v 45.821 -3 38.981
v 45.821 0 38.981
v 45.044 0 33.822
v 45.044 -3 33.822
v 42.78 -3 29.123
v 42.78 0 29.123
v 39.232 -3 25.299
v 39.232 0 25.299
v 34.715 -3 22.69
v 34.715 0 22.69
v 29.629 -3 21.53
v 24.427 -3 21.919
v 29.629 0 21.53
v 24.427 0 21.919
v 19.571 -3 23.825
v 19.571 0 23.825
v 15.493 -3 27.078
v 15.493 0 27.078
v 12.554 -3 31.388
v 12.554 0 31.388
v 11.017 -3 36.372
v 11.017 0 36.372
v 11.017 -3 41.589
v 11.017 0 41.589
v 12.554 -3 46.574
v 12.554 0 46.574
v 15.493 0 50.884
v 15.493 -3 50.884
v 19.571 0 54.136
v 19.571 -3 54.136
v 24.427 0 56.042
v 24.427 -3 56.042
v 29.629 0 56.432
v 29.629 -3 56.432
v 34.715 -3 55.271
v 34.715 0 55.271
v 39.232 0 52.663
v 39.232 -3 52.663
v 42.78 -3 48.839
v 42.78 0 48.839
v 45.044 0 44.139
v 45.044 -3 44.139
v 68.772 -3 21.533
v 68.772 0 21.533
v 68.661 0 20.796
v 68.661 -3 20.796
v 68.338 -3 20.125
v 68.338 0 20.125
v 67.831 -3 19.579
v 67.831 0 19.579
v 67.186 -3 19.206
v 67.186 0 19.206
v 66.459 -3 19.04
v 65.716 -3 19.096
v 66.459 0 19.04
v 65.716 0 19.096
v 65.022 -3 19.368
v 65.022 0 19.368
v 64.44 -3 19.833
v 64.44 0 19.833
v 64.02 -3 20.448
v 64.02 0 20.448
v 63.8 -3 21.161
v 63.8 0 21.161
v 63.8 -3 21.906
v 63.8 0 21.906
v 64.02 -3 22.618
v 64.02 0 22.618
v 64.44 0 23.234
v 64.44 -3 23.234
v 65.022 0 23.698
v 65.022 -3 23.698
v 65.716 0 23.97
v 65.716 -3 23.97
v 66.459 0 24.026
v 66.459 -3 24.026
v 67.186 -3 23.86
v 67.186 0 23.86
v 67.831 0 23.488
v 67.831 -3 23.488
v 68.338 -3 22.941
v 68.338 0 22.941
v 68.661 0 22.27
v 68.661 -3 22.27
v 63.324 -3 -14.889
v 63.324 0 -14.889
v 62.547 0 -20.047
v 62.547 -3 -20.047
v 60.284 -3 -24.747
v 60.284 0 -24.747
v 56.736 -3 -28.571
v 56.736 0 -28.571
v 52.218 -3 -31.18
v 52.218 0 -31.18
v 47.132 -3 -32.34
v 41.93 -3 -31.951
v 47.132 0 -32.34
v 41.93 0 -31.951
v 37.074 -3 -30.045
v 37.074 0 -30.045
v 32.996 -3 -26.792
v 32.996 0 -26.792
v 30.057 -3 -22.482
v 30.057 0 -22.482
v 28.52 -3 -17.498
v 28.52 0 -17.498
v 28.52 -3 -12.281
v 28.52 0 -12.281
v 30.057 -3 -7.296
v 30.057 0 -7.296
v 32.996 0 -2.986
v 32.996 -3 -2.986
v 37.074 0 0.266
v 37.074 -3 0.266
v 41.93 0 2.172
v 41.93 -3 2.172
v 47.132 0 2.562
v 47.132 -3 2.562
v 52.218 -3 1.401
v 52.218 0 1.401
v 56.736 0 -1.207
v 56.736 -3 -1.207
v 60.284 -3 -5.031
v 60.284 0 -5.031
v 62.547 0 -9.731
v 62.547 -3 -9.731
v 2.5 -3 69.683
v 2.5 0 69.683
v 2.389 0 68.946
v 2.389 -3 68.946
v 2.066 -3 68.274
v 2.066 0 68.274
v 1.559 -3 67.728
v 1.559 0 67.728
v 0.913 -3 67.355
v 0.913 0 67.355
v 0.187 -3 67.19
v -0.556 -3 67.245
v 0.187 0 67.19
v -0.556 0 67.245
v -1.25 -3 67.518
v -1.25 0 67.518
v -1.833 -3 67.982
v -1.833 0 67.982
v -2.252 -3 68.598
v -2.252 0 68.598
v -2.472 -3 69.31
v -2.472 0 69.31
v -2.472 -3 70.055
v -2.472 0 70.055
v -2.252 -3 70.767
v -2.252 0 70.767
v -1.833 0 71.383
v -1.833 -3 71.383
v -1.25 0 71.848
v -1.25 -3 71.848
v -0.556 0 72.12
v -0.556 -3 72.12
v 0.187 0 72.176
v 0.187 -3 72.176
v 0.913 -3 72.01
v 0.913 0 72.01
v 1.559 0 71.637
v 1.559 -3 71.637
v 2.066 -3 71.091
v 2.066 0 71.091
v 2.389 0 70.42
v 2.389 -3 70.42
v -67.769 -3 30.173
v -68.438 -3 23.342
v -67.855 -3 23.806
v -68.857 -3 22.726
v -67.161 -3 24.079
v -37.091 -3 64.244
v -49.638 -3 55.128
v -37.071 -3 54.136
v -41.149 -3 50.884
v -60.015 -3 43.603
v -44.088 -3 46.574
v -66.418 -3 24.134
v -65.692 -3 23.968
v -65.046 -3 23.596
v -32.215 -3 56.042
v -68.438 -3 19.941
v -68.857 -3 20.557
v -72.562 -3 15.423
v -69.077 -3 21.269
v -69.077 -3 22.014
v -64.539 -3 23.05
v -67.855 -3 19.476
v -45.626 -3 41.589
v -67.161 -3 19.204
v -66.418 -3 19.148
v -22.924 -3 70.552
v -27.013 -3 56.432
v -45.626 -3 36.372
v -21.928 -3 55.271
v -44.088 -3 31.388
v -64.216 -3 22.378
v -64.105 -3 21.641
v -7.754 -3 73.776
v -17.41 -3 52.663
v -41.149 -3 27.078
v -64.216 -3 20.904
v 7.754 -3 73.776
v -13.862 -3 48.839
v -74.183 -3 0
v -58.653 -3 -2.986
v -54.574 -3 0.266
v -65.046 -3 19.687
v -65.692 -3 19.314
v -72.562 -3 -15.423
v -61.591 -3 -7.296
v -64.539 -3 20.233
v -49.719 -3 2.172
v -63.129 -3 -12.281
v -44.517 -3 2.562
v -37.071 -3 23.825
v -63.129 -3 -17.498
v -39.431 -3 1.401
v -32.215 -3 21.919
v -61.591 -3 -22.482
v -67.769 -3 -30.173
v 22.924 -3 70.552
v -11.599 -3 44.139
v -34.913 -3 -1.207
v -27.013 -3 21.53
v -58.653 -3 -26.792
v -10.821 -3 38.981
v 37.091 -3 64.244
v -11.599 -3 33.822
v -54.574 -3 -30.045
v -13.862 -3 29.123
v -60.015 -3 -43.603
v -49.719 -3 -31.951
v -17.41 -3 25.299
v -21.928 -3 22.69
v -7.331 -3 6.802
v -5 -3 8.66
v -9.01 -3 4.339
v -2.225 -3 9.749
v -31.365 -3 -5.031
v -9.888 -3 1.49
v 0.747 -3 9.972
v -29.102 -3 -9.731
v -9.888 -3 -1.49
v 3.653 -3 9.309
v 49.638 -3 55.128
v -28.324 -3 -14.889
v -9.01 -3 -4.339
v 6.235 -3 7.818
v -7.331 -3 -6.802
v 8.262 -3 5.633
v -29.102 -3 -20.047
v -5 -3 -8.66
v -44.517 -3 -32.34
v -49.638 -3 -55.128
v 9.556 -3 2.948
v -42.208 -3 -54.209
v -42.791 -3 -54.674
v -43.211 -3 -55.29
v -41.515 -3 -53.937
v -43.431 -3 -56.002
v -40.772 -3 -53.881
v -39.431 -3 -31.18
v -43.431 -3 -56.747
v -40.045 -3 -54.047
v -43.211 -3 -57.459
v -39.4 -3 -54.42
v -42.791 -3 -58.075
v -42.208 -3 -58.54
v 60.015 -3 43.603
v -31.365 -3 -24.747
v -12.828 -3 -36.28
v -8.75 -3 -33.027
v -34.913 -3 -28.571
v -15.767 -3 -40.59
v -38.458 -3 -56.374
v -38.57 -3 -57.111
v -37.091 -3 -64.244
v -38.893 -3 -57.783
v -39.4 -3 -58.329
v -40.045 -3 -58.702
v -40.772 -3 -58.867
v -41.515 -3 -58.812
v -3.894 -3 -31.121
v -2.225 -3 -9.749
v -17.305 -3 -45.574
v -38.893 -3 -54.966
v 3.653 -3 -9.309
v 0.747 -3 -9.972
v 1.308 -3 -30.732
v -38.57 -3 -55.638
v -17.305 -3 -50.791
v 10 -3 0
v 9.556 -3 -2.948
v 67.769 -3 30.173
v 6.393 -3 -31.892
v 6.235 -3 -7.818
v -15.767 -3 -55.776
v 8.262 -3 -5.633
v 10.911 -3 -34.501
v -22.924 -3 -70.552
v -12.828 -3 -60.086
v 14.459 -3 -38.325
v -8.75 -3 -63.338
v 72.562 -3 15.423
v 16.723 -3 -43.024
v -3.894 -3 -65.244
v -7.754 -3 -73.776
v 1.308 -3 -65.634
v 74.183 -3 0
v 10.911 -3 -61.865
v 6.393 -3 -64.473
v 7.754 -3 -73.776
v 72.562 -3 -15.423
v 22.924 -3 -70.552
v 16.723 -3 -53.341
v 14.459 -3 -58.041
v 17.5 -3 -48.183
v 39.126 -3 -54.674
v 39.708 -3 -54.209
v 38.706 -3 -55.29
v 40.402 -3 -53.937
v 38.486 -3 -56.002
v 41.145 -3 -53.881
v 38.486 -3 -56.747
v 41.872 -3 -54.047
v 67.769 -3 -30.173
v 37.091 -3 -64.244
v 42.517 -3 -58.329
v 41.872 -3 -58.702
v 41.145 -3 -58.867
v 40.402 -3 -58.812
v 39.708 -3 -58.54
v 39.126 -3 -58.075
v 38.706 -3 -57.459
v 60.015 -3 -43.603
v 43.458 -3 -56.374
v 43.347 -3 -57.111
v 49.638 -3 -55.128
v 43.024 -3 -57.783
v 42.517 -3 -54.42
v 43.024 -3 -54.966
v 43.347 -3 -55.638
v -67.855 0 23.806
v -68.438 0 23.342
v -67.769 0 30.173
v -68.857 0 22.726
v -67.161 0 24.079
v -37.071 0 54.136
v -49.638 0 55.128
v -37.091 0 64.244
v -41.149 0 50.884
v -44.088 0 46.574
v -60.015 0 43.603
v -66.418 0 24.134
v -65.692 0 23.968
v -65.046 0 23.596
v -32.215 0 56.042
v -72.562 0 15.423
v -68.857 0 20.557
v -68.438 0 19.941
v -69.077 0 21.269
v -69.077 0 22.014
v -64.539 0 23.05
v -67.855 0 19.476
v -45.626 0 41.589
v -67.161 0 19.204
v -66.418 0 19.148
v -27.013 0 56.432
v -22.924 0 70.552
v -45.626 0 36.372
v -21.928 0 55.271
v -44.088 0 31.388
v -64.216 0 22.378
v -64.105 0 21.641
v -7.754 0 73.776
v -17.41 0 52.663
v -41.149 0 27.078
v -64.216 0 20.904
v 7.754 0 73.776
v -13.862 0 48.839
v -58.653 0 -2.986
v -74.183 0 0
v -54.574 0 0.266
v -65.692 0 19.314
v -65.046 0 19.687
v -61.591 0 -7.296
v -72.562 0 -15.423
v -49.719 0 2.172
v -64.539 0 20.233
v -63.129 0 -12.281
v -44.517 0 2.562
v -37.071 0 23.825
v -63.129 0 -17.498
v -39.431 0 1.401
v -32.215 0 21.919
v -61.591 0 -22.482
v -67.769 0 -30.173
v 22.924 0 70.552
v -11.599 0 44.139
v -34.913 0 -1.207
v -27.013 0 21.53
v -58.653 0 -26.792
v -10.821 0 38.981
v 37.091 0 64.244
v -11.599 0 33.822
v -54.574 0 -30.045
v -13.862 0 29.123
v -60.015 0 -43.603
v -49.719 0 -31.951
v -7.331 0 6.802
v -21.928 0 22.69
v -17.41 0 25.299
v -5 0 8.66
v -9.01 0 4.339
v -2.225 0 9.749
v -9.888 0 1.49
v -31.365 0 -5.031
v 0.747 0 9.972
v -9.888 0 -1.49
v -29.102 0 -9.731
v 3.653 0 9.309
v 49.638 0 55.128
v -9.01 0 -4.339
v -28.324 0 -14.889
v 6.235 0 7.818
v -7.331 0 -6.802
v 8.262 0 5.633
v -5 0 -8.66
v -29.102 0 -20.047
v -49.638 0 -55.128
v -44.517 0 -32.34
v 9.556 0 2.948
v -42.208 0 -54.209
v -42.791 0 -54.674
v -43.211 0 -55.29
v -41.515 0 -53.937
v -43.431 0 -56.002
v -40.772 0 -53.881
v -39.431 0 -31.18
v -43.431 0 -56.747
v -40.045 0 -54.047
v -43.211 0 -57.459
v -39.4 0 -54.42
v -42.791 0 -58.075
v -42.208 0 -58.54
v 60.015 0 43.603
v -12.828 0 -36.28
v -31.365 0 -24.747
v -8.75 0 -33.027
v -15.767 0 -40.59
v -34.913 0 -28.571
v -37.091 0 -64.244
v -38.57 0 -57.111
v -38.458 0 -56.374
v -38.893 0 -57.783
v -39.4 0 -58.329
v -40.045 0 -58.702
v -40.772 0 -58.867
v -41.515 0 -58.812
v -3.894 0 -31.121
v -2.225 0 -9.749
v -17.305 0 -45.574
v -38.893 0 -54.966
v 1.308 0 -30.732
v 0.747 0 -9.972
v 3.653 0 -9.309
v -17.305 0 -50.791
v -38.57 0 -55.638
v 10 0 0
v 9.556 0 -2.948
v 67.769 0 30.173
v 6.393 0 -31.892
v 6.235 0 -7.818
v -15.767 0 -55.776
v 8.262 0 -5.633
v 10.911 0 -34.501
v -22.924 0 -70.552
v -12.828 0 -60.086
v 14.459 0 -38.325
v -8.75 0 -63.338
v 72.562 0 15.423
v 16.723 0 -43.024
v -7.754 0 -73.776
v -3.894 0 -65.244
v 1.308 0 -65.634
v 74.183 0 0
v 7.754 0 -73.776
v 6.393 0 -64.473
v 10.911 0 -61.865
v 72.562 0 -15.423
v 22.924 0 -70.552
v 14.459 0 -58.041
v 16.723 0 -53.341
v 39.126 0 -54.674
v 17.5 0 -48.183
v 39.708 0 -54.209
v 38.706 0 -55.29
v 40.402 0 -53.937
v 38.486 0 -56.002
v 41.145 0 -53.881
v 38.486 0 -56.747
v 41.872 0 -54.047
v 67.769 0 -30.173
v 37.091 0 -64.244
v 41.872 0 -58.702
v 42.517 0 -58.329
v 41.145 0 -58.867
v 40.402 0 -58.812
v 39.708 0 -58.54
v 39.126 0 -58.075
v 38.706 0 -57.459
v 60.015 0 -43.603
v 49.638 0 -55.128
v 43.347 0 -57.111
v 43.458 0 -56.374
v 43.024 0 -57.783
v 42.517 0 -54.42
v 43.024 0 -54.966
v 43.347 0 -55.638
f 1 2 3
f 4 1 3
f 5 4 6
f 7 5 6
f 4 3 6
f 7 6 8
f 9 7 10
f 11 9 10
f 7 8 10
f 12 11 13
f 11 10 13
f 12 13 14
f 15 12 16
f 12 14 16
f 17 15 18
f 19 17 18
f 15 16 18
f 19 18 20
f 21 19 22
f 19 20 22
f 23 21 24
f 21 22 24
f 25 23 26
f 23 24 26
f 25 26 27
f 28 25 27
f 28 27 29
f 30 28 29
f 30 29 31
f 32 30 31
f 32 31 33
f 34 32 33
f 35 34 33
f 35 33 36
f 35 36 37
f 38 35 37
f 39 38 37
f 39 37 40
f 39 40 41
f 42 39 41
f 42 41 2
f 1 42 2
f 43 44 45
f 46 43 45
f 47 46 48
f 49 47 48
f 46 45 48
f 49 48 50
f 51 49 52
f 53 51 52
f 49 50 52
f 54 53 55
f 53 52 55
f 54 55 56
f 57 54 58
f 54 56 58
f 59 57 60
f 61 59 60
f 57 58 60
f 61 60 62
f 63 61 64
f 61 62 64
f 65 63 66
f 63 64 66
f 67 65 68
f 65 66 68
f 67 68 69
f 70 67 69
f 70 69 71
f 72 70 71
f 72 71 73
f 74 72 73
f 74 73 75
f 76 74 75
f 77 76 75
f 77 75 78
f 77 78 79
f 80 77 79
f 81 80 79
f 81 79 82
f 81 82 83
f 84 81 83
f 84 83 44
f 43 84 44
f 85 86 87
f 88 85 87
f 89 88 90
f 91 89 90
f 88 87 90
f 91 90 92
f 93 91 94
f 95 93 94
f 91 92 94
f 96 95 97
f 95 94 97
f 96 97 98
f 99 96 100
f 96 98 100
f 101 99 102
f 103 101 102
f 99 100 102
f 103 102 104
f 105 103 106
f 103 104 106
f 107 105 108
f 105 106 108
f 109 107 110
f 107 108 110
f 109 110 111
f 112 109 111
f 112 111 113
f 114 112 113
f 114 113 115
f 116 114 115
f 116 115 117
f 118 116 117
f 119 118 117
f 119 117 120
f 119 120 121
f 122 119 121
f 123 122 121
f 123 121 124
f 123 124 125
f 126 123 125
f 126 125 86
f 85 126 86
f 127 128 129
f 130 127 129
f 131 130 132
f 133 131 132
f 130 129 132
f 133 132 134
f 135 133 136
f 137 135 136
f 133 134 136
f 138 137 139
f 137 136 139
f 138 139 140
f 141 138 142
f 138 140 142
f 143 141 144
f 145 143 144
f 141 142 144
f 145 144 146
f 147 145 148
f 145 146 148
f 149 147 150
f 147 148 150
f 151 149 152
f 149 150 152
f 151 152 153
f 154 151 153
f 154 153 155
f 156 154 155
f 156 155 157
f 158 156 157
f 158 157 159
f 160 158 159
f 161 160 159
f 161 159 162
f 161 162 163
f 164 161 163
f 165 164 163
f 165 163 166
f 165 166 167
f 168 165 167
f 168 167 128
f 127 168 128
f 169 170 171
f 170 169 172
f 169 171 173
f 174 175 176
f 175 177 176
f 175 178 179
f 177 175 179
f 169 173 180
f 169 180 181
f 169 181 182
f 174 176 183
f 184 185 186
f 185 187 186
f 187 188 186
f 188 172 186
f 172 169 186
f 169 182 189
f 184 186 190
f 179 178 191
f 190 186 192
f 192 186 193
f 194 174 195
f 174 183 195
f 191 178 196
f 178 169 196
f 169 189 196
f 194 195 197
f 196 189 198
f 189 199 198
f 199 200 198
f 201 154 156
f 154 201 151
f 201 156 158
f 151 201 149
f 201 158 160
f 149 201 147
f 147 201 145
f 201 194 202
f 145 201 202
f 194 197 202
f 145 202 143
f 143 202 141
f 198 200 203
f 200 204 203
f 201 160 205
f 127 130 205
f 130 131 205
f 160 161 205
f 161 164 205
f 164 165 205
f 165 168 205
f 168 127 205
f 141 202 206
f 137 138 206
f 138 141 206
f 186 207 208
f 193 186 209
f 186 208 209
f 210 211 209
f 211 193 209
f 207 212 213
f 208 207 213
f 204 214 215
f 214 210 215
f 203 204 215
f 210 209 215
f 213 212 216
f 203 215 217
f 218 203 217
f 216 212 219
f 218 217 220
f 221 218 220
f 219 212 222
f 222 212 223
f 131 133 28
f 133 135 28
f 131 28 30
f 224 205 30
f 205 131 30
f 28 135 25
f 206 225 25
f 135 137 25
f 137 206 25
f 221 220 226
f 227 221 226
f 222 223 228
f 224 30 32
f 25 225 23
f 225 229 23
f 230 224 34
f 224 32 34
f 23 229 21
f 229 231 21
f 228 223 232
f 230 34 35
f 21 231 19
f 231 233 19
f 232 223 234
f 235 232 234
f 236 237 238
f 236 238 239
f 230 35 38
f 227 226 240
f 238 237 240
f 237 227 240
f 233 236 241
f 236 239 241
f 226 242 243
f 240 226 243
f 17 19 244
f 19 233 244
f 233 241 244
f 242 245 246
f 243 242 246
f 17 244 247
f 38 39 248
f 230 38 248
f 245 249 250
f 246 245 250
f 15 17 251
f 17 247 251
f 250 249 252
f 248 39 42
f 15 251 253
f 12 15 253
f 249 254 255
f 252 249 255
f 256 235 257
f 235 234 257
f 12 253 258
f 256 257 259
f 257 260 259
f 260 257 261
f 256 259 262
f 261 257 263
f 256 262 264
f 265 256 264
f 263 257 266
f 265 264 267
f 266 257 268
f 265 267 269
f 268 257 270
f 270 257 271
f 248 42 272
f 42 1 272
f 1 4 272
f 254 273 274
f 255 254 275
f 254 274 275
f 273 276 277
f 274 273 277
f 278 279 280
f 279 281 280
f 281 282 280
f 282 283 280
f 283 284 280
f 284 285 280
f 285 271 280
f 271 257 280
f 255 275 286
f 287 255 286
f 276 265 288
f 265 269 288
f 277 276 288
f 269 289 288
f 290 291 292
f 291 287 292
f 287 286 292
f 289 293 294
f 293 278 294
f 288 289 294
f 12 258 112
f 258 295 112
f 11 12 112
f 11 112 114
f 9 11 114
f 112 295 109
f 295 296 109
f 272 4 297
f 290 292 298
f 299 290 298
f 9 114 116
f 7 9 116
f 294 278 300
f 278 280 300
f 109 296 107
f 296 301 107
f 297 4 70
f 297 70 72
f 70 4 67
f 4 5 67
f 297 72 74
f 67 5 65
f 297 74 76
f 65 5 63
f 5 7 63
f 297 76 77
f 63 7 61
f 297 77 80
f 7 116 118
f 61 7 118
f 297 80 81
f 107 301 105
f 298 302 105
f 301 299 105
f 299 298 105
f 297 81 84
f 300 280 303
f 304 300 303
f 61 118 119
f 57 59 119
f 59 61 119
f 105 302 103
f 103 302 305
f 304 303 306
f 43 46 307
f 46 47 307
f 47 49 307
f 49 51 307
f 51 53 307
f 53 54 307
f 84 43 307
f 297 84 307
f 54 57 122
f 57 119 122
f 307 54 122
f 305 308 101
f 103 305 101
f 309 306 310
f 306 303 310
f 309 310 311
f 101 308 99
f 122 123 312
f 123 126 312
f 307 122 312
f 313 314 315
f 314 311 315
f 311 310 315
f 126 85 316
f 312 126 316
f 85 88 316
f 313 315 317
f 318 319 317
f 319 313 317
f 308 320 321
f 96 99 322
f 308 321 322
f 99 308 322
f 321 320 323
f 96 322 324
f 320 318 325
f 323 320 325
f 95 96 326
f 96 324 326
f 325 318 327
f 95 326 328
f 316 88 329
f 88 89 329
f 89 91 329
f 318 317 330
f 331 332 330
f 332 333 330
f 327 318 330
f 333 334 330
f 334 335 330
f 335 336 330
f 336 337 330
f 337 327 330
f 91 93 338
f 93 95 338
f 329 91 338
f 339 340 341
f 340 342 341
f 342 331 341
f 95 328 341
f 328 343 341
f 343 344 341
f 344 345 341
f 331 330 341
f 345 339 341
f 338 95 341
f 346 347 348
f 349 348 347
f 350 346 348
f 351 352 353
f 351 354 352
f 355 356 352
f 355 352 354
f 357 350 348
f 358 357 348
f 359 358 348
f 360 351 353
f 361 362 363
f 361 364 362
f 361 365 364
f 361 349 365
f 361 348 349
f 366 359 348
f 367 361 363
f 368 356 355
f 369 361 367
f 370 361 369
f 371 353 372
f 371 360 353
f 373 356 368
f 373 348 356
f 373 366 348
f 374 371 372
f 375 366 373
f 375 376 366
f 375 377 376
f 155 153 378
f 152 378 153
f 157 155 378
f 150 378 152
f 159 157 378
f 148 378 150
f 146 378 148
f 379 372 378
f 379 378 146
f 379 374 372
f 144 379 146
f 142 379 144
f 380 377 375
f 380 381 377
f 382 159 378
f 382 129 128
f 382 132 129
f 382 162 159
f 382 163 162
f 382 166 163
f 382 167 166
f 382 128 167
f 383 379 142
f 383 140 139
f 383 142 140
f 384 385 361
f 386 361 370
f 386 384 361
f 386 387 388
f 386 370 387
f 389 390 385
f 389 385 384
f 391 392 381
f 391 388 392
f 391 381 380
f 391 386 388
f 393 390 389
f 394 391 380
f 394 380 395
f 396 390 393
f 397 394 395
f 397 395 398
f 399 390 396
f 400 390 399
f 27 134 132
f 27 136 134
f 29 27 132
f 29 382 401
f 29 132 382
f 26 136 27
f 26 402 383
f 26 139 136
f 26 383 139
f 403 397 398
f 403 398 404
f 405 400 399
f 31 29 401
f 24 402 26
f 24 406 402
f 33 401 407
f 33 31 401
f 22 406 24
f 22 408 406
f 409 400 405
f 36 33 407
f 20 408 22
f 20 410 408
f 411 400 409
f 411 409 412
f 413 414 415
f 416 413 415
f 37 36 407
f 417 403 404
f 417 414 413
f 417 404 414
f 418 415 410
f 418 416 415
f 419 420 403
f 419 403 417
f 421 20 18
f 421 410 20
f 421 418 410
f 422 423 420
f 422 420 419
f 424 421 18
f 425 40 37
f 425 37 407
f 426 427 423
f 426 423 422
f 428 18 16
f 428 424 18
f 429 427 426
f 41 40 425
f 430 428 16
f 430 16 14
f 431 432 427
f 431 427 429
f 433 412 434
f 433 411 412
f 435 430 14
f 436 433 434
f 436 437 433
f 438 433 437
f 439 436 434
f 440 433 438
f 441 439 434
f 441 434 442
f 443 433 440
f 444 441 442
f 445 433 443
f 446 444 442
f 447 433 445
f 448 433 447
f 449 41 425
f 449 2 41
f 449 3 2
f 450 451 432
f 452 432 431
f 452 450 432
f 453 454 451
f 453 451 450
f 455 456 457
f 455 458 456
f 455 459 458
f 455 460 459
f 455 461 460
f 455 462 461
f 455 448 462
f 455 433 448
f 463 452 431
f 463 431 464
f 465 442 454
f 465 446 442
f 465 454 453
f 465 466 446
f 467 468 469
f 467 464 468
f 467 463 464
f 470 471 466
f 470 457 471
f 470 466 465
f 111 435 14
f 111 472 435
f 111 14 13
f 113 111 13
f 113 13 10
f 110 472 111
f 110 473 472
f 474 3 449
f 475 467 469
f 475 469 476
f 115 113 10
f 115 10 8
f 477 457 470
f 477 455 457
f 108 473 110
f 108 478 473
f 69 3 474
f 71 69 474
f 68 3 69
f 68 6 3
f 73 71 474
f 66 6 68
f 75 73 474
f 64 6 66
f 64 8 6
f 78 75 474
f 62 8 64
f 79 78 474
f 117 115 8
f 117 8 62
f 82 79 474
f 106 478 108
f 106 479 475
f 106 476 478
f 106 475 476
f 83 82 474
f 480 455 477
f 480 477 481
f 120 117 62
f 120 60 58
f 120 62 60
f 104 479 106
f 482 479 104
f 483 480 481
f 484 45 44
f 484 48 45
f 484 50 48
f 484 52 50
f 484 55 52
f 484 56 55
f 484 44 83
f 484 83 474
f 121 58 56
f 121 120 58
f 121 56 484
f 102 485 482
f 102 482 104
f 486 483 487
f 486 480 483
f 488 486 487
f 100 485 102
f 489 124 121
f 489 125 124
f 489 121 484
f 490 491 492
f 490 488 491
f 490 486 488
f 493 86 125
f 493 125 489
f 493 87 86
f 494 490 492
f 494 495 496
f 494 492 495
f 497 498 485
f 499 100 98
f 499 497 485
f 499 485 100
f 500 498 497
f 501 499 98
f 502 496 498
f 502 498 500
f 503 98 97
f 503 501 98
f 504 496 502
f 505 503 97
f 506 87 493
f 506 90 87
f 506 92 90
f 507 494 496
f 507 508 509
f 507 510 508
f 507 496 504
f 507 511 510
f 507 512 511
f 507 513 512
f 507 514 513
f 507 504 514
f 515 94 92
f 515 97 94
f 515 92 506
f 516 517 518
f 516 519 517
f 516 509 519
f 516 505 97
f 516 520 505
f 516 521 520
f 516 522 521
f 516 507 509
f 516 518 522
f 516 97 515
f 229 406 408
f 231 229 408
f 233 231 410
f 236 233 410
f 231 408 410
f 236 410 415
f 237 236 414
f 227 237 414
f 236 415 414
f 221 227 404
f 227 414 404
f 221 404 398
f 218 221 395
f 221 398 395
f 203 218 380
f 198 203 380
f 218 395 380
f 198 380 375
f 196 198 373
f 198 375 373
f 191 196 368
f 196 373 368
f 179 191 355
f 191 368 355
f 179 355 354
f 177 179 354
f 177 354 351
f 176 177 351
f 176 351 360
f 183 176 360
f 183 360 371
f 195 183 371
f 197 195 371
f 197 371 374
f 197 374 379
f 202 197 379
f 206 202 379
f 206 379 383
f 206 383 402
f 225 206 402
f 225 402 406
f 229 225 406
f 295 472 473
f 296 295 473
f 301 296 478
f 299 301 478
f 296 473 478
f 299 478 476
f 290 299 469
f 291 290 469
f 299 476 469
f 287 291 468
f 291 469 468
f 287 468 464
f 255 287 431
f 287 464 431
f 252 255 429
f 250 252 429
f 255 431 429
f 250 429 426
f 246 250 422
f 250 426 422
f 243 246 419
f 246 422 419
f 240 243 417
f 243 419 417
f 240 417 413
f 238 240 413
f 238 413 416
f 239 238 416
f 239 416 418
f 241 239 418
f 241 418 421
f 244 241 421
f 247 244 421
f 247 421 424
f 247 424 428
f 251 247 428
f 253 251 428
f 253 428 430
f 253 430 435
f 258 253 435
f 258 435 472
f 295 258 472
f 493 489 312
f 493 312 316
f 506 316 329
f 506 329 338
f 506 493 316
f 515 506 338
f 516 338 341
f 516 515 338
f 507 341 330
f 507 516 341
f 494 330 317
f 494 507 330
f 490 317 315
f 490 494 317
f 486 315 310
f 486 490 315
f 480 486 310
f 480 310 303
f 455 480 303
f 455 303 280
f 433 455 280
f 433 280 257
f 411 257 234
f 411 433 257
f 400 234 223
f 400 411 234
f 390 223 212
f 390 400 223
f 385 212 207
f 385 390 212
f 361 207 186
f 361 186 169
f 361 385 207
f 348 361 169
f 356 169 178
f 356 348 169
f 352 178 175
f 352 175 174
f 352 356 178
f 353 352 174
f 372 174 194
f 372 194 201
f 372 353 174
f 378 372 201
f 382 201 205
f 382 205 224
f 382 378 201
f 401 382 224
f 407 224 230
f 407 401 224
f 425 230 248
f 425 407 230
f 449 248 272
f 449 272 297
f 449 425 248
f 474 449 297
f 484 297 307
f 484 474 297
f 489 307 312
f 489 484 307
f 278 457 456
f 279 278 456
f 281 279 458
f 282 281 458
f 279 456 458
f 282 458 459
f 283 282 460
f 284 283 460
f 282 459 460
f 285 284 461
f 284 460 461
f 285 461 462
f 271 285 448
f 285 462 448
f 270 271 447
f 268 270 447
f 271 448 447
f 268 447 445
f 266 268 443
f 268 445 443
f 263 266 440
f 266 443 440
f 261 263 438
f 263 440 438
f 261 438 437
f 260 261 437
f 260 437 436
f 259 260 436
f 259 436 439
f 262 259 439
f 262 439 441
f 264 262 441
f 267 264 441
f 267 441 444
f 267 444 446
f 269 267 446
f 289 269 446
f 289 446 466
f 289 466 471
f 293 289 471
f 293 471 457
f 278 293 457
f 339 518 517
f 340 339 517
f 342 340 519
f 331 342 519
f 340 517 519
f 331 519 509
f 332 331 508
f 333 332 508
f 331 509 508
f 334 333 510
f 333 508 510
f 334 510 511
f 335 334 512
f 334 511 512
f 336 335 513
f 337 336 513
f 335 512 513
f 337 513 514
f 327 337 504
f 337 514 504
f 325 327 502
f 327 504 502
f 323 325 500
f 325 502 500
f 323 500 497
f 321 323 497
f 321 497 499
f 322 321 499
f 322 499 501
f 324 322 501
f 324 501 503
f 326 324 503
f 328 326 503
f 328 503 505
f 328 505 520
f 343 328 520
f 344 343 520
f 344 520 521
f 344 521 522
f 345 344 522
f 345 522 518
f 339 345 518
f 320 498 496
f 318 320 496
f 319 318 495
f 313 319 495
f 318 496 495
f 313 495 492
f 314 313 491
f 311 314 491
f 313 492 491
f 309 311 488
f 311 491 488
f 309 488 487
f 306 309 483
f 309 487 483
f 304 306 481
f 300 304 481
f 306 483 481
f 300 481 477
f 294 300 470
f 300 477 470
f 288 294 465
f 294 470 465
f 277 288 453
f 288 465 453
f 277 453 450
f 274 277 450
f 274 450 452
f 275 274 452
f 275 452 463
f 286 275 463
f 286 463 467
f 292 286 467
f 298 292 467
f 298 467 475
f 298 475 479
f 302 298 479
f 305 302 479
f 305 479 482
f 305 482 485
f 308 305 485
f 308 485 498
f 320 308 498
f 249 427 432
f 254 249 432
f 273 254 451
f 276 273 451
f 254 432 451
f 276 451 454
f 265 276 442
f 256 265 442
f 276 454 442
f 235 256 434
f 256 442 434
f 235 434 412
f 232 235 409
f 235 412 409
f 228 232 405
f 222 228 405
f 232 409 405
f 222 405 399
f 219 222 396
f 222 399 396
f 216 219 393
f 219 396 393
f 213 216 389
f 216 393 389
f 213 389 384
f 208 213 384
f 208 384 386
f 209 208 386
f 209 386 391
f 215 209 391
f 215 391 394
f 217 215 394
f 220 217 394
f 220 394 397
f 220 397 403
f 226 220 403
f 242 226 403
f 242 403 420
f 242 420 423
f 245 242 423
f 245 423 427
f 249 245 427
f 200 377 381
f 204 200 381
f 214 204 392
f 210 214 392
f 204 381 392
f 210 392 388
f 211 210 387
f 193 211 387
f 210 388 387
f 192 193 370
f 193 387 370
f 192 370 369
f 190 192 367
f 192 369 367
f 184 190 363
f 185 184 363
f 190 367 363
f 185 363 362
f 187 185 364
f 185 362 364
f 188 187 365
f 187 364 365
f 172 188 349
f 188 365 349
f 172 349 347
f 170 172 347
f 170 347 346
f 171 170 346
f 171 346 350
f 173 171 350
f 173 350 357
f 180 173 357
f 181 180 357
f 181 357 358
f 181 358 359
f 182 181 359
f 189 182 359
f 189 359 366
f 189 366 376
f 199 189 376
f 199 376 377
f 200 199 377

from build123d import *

# Parameters (mm, degrees)
SKETCH1_R           = 74.18267629
BOSS_EXTRUDE2_DEPTH = 3
SKETCH1_4_R         = 17.5
SKETCH1_4_R_2       = 10
CUT_EXTRUDE1_DEPTH  = 4
SKETCH1_5_R         = 2.5
CUT_EXTRUDE2_DEPTH  = 4


with BuildPart() as part:
    # Sketch1 → Boss-Extrude2 (new body)
    with BuildSketch(Plane(origin=(0, 0, 0), x_dir=(1, 0, 0), z_dir=(0, 1, 0))):
        Circle(SKETCH1_R)
    extrude(amount=-BOSS_EXTRUDE2_DEPTH)

    # Sketch1<4> → Cut-Extrude1 (cut)
    with BuildSketch(Plane(origin=(0, 0, 0), x_dir=(1, 0, 0), z_dir=(0, 1, 0))):
        with Locations((0, 48.18267629)):
            Circle(SKETCH1_4_R)
        with Locations((45.824448258, 14.889265808)):
            Circle(SKETCH1_4_R)
        with Locations((28.321066539, -38.980603953)):
            Circle(SKETCH1_4_R)
        with Locations((-28.321066539, -38.980603953)):
            Circle(SKETCH1_4_R)
        with Locations((-45.824448258, 14.889265808)):
            Circle(SKETCH1_4_R)
        Circle(SKETCH1_4_R_2)
    extrude(amount=-CUT_EXTRUDE1_DEPTH, mode=Mode.SUBTRACT)

    # Sketch1<5> → Cut-Extrude2 (cut)
    with BuildSketch(Plane(origin=(0, 0, 0), x_dir=(1, 0, 0), z_dir=(0, 1, 0))):
        with Locations((40.958449464, 56.374469332)):
            Circle(SKETCH1_5_R)
        with Locations((66.272163358, -21.533131187)):
            Circle(SKETCH1_5_R)
        with Locations((0, -69.68267629)):
            Circle(SKETCH1_5_R)
        with Locations((-66.605033139, -21.641287135)):
            Circle(SKETCH1_5_R)
        with Locations((-40.958449464, 56.374469332)):
            Circle(SKETCH1_5_R)
    extrude(amount=-CUT_EXTRUDE2_DEPTH, mode=Mode.SUBTRACT)


solid = part.part
